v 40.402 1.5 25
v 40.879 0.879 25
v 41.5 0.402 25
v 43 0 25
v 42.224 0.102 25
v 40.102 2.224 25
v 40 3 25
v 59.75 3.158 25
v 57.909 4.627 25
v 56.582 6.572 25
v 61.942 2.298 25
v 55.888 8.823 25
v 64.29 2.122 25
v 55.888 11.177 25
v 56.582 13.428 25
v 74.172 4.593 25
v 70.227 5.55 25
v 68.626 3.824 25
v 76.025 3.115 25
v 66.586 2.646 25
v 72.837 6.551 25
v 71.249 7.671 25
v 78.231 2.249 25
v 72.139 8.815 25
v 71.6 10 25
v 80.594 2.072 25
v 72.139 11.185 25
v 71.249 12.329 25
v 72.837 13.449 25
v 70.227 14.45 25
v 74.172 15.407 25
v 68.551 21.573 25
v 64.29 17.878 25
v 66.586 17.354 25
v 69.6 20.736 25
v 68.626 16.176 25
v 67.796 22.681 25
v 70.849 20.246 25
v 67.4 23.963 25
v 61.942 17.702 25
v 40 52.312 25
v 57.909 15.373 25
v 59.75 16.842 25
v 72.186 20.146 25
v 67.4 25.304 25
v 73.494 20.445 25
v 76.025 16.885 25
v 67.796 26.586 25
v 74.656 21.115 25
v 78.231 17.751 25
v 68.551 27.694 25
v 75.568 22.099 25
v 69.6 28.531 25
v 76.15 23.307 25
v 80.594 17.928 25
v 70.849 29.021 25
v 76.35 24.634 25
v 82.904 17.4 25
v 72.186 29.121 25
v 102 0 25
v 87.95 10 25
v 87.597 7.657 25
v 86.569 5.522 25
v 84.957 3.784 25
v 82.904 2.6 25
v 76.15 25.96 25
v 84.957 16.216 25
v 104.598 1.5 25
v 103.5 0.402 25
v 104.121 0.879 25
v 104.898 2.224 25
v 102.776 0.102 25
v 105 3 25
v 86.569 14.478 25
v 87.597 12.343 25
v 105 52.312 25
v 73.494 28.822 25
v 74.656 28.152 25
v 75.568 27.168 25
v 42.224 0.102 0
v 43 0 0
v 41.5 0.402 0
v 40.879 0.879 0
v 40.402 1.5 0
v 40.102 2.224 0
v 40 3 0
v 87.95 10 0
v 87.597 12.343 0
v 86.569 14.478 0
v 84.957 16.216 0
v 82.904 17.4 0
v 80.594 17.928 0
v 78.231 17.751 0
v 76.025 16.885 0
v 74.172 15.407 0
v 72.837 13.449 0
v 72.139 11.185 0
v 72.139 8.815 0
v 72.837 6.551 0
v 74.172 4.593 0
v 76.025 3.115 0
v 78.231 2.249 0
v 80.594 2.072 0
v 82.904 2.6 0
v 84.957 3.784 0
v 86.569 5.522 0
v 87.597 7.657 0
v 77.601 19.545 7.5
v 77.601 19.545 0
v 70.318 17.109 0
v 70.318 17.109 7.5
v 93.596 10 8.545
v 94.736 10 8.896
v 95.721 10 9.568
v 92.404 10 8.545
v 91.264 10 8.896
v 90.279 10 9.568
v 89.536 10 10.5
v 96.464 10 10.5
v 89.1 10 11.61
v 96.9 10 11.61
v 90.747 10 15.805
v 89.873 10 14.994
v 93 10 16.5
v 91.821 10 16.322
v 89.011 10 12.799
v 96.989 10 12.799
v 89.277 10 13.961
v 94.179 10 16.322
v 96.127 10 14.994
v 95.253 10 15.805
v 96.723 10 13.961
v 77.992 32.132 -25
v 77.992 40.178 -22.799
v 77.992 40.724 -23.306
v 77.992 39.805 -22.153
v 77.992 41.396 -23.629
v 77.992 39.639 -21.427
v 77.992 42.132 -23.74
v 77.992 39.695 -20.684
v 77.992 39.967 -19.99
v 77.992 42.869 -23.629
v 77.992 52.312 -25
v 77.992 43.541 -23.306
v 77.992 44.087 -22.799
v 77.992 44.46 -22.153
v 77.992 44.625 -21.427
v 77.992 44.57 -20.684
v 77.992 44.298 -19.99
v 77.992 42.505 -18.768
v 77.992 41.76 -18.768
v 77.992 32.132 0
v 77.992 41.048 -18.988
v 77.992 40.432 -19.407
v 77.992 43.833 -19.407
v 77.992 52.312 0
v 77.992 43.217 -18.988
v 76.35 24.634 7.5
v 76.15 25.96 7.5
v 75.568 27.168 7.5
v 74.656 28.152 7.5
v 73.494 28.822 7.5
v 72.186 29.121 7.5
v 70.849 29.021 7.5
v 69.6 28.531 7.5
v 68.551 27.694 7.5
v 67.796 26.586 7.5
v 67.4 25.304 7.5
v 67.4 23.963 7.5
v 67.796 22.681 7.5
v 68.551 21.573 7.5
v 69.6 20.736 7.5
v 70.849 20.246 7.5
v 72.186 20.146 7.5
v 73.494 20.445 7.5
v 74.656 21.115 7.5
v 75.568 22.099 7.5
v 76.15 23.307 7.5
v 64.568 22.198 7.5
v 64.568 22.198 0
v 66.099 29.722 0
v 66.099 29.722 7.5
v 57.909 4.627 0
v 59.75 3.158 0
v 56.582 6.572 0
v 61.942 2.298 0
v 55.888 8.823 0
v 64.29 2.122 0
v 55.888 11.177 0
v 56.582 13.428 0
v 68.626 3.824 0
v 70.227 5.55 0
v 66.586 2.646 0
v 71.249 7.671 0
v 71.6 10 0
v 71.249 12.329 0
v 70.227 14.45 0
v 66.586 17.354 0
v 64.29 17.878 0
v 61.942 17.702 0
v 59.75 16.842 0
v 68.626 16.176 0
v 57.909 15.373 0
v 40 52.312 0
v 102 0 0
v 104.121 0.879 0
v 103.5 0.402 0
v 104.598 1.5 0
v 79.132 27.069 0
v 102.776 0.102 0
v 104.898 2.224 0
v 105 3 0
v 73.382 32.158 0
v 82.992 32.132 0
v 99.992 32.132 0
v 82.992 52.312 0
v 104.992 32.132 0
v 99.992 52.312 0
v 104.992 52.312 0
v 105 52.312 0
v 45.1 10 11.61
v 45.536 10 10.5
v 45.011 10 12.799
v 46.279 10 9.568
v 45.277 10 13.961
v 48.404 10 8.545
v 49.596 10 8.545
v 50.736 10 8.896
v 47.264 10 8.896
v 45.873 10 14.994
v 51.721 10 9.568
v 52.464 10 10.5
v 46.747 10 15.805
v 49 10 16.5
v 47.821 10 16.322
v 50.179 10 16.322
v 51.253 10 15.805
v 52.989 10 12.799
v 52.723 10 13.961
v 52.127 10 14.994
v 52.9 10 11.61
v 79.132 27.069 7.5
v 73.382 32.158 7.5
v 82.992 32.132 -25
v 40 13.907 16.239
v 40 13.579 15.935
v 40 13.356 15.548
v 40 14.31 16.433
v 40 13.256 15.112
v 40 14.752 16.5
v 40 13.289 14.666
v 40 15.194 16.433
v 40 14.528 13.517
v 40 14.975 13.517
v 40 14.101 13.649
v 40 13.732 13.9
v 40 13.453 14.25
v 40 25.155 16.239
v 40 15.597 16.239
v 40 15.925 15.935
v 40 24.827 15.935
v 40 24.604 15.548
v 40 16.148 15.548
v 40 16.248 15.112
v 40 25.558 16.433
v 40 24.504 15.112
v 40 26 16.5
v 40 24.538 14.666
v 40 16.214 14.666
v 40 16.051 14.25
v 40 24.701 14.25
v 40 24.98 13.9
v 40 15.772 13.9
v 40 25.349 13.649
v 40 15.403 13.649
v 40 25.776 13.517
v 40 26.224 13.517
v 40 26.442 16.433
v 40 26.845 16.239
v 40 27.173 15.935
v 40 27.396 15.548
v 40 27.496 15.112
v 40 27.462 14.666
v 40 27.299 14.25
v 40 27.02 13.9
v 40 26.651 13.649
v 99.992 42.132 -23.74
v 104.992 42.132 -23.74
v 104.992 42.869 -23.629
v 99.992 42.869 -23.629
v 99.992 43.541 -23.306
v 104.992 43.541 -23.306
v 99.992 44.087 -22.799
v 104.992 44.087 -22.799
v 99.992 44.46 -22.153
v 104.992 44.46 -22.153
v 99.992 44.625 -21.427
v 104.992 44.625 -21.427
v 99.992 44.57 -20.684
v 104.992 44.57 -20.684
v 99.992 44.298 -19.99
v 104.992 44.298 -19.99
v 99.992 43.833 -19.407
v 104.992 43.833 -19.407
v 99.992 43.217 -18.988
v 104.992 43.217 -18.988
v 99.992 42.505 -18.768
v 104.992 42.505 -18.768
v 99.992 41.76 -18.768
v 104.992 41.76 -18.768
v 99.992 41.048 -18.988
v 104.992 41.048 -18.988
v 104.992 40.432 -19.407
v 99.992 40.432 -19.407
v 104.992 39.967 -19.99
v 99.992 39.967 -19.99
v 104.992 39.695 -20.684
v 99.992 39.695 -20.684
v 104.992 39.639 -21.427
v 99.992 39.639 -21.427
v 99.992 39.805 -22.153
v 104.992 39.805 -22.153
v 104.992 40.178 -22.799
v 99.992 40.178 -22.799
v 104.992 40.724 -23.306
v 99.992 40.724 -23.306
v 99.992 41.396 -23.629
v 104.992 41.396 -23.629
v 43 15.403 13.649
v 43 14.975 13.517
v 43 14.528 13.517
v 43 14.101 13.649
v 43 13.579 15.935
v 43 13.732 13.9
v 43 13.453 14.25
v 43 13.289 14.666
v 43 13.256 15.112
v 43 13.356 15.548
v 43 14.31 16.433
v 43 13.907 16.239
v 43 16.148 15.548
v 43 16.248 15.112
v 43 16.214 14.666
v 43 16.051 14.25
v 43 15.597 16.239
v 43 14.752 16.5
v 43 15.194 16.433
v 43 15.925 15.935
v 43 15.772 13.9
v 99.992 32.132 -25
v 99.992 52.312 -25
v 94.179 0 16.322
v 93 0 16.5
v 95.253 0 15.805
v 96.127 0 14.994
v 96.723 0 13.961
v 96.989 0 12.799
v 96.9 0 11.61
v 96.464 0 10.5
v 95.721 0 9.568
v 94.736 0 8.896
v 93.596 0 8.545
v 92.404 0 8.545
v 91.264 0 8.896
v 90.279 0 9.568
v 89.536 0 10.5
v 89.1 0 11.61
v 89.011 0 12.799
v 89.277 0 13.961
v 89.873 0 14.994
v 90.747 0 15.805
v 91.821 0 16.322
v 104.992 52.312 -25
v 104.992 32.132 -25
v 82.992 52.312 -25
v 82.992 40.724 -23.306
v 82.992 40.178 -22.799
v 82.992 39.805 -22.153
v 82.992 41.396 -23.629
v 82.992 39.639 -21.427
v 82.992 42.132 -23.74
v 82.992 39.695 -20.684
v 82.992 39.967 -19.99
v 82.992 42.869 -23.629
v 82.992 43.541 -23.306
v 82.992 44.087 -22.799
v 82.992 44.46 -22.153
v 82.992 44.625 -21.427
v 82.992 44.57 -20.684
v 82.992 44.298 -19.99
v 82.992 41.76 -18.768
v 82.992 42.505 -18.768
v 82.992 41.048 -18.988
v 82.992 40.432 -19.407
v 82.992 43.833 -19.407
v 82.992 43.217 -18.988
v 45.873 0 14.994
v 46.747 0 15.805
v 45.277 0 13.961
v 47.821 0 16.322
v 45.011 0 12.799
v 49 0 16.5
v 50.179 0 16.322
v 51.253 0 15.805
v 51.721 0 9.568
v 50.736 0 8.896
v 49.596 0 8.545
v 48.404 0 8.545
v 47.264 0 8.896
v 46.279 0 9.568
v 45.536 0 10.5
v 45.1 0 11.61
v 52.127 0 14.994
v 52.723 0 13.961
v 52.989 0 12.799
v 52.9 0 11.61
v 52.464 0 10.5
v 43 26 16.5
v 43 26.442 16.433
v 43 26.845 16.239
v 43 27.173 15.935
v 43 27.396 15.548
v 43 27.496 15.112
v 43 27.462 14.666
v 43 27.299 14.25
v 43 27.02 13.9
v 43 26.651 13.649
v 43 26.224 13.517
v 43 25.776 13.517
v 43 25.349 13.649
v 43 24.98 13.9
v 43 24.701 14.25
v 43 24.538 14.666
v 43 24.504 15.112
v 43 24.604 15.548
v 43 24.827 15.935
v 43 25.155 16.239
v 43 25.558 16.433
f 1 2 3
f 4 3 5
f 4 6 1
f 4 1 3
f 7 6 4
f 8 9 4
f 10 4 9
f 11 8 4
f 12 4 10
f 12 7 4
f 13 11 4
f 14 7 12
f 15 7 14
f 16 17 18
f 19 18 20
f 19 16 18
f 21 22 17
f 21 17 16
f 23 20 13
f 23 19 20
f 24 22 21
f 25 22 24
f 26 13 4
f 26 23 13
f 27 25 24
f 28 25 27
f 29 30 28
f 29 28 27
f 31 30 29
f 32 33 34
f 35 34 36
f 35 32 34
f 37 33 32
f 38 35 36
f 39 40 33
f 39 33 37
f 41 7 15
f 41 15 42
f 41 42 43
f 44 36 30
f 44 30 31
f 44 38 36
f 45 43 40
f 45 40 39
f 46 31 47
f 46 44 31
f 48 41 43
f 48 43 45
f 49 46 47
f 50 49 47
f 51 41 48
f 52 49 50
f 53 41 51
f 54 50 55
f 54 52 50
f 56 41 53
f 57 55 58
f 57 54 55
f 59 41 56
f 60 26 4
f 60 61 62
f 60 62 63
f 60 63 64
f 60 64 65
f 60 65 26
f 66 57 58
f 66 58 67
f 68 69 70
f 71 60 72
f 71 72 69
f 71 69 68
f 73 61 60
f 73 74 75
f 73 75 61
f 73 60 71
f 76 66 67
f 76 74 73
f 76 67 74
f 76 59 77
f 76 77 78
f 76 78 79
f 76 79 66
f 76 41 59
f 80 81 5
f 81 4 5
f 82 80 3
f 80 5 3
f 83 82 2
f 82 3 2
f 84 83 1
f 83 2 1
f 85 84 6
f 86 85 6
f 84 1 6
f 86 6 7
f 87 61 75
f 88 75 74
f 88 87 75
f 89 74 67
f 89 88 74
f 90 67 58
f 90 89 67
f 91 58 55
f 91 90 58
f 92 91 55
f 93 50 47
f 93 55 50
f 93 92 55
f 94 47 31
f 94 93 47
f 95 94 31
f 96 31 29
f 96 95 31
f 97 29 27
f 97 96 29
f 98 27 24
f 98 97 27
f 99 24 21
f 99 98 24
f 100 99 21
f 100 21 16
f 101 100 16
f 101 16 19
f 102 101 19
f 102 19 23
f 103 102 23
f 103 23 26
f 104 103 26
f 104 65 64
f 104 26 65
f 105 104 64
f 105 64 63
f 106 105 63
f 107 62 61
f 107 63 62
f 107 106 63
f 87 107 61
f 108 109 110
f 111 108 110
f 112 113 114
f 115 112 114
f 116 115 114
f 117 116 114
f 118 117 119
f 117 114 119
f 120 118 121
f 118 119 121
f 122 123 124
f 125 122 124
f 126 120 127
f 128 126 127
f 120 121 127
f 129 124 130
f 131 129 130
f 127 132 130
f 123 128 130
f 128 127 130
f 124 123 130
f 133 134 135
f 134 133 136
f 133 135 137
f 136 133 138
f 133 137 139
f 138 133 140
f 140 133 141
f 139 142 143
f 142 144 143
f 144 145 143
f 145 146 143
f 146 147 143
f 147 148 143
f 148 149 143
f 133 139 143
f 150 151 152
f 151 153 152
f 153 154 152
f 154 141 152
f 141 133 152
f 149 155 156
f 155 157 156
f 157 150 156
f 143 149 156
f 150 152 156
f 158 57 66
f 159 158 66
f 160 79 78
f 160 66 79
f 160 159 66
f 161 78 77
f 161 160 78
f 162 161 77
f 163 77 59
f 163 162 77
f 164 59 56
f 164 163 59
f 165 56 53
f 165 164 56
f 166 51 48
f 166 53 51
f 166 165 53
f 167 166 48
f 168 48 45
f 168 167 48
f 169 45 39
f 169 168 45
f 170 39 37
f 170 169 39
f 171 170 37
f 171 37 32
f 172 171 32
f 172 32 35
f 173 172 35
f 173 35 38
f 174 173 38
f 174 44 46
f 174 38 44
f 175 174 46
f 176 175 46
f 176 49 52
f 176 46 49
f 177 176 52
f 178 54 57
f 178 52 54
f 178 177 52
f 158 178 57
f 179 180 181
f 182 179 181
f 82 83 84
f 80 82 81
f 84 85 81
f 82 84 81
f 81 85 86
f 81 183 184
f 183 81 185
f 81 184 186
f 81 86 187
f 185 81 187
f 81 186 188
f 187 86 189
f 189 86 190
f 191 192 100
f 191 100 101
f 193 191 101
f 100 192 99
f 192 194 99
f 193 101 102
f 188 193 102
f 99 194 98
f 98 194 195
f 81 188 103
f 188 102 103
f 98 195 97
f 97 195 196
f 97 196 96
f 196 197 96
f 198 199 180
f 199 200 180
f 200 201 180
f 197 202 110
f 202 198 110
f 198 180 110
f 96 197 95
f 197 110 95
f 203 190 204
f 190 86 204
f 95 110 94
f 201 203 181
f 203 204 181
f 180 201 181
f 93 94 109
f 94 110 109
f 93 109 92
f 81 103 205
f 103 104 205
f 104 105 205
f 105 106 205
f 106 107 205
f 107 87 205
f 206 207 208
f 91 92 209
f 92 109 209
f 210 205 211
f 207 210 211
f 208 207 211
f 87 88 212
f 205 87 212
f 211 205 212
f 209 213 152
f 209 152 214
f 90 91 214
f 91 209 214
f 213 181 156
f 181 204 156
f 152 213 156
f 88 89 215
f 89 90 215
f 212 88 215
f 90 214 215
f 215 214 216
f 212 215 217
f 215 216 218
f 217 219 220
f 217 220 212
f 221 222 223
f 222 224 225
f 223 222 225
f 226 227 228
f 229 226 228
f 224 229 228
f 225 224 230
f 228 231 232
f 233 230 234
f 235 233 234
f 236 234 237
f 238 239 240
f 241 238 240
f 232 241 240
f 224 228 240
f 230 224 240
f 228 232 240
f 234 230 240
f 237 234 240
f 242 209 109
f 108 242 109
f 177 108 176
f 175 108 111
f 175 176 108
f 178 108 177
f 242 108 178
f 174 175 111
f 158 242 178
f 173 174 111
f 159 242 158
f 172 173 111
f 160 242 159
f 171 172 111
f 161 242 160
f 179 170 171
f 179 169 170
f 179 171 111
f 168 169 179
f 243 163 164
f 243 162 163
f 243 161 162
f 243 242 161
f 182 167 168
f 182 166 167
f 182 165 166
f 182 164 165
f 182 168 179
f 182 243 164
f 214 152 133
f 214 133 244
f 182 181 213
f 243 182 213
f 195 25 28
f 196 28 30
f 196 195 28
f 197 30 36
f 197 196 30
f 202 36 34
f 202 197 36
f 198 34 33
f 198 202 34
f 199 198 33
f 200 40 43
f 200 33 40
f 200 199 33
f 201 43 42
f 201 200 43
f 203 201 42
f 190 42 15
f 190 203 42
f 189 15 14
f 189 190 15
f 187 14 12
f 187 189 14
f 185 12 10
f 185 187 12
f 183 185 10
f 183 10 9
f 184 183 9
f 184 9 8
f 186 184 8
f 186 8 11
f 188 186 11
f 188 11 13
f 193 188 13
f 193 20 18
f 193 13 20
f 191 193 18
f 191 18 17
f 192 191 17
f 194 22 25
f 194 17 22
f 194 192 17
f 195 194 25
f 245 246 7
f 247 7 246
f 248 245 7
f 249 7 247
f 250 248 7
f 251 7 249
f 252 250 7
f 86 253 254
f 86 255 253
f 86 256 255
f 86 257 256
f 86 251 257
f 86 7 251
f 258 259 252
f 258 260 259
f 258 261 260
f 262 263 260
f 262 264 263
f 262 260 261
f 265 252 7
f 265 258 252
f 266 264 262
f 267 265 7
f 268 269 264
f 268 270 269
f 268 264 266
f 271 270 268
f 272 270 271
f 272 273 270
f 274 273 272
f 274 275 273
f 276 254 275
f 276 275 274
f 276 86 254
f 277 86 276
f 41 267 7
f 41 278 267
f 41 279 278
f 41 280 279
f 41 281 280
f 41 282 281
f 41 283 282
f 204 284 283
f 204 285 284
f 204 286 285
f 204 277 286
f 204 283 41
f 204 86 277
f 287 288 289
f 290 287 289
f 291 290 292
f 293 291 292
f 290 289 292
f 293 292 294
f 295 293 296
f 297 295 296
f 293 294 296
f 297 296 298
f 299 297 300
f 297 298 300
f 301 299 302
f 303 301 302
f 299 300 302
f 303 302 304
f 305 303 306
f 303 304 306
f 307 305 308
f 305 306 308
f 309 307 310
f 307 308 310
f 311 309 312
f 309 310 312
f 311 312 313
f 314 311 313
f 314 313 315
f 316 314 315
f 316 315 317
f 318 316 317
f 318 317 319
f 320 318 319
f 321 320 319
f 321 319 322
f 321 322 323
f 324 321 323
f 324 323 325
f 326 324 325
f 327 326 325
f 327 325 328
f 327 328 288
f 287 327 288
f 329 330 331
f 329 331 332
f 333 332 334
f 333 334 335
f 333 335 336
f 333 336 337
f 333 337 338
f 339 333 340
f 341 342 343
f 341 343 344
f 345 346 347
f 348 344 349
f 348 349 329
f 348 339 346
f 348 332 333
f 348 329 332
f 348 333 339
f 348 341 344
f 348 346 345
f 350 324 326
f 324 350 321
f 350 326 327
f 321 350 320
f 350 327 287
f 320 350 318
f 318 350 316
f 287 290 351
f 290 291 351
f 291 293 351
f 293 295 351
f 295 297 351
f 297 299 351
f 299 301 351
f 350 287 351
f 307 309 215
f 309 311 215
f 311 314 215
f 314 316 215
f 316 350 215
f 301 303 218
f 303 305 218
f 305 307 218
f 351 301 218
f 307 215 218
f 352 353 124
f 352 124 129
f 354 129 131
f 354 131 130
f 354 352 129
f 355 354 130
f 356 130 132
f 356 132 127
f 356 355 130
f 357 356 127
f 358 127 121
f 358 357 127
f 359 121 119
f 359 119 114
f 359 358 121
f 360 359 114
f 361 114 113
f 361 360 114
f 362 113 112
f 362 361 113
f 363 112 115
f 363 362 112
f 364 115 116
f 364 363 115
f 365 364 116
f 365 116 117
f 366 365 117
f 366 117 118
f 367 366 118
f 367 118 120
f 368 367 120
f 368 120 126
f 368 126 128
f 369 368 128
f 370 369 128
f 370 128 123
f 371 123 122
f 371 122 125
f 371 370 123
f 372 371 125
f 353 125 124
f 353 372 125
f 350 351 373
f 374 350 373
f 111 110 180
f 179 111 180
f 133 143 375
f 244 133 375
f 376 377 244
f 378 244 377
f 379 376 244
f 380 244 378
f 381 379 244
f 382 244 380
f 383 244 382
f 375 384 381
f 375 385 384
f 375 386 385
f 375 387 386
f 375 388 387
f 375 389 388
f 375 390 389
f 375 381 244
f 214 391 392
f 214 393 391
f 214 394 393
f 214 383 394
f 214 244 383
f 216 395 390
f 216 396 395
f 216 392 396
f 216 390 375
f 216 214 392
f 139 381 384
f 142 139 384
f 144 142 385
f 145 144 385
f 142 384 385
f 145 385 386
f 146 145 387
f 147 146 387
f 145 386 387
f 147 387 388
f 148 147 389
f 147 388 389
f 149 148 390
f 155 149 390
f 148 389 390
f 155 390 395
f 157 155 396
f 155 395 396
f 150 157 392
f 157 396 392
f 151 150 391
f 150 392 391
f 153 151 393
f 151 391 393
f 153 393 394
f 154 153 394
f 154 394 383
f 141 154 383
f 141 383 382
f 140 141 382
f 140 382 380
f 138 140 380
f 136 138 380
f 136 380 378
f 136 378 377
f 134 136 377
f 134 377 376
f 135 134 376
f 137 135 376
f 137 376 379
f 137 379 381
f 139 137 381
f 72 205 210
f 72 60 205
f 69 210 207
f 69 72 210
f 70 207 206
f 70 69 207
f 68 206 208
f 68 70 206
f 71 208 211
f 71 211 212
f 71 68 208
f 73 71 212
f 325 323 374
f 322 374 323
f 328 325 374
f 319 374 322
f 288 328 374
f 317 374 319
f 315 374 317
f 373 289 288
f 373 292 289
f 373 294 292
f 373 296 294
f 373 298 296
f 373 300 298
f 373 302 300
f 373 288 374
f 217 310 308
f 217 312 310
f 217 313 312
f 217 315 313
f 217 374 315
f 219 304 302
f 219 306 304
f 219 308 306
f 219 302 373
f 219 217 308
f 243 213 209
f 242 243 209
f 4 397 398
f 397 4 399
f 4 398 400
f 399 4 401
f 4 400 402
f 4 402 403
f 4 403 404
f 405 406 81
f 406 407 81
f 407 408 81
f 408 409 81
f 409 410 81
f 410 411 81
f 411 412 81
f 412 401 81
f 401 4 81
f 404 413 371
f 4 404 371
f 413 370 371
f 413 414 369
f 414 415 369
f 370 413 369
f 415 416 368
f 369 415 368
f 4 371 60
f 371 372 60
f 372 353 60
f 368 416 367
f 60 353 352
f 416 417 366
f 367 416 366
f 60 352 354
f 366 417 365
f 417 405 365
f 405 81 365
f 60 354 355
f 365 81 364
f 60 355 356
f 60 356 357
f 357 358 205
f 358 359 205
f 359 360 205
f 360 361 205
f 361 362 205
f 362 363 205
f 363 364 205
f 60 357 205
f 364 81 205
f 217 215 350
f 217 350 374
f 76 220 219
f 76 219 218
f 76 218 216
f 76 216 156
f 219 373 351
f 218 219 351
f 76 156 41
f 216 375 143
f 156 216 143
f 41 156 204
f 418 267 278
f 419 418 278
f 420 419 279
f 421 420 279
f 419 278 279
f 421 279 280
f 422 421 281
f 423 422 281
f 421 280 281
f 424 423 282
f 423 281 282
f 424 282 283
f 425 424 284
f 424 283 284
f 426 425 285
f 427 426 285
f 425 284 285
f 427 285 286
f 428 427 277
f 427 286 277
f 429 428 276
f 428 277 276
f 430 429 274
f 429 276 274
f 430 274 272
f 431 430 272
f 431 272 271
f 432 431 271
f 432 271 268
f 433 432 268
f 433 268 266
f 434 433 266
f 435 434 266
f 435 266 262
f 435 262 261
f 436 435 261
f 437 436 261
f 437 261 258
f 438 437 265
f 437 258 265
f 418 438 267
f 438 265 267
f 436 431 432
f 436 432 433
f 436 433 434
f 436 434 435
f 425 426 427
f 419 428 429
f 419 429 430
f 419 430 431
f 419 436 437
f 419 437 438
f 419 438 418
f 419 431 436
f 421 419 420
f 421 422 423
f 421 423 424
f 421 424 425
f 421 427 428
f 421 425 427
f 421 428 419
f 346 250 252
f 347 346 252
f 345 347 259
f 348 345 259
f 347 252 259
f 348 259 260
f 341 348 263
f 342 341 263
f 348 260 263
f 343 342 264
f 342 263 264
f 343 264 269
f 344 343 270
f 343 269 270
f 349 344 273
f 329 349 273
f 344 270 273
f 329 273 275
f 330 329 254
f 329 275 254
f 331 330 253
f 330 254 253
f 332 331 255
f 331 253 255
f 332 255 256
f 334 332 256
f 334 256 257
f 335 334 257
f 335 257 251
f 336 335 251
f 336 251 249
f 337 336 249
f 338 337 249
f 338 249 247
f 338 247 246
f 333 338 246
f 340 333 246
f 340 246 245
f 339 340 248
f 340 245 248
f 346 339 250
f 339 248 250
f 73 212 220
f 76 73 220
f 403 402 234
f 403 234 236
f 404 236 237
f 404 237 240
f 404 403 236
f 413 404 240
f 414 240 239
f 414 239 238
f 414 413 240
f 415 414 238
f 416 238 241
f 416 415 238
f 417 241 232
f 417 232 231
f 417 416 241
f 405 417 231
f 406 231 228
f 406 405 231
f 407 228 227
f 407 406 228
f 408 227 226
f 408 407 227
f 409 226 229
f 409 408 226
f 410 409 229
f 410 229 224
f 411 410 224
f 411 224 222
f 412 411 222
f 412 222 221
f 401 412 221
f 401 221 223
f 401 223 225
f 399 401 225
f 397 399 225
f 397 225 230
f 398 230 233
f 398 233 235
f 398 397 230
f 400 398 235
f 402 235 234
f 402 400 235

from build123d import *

# Parameters (mm, degrees)
ESQUISSE1_W              = 105
ESQUISSE1_H              = 80
BOSS_EXTRU_1_DEPTH       = 25
ESQUISSE2_R              = 7.9
ESQUISSE2_R_2            = 7.95
ESQUISSE2_R_3            = 4.5
ENL_V_MAT_EXTRU_1_DEPTH  = 135.350288425
ESQUISSE3_R              = 4
ENL_V_MAT_EXTRU_3_DEPTH  = 10
ESQUISSE6_W              = 40
ESQUISSE6_H              = 80
ENL_V_MAT_EXTRU_6_DEPTH  = 135.350288425
ESQUISSE7_W              = 65
ESQUISSE7_H              = 2.68813313
ENL_V_MAT_EXTRU_7_DEPTH  = 135.350288425
CONG_1_R                 = 3
ESQUISSE9_W              = 5
ESQUISSE9_H              = 20.179429856
ESQUISSE9_H_2            = 20.18
BOSS_EXTRU_2_DEPTH       = 25
ESQUISSE10_R             = 2.5
ENL_V_MAT_EXTRU_8_DEPTH  = 105.048287139
ENL_V_MAT_EXTRU_9_DEPTH  = 7.5
ENL_V_MAT_EXTRU_11_DEPTH = 133.767182537
ESQUISSE13_R             = 1.5
ENL_V_MAT_EXTRU_12_DEPTH = 3


with BuildPart() as part:
    # Esquisse1 → Boss.-Extru.1 (new body)
    with BuildSketch(Plane.XY):
        with Locations((52.5, 40)):
            Rectangle(ESQUISSE1_W, ESQUISSE1_H)
    extrude(amount=BOSS_EXTRU_1_DEPTH)

    # Esquisse2 → Enlèv. mat.-Extru.1 (cut, through all)
    with BuildSketch(Plane.XY):
        with Locations((63.7, 10)):
            Circle(ESQUISSE2_R)
        with Locations((80, 10)):
            Circle(ESQUISSE2_R_2)
        with Locations((71.85, 24.633523157)):
            Circle(ESQUISSE2_R_3)
    extrude(amount=ENL_V_MAT_EXTRU_1_DEPTH, mode=Mode.SUBTRACT)

    # Esquisse3 → Enlèv. mat.-Extru.3 (cut)
    with BuildSketch(Plane(origin=(0, 0, 0), x_dir=(1, 0, 0), z_dir=(0, 1, 0))):
        with Locations(Location((49, -12.5, 0), (0, 0, 270))):
            Circle(ESQUISSE3_R)
        with Locations(Location((93, -12.5, 0), (0, 0, 270))):
            Circle(ESQUISSE3_R)
    extrude(amount=ENL_V_MAT_EXTRU_3_DEPTH, mode=Mode.SUBTRACT)

    # Esquisse6 → Enlèv. mat.-Extru.6 (cut, through all)
    with BuildSketch(Plane.XY):
        with Locations((20, 40)):
            Rectangle(ESQUISSE6_W, ESQUISSE6_H)
    extrude(amount=ENL_V_MAT_EXTRU_6_DEPTH, mode=Mode.SUBTRACT)

    # Esquisse7 → Enlèv. mat.-Extru.7 (cut, through all)
    with BuildSketch(Plane.XY):
        with Locations((72.5, 78.655933435)):
            Rectangle(ESQUISSE7_W, ESQUISSE7_H)
    extrude(amount=ENL_V_MAT_EXTRU_7_DEPTH, mode=Mode.SUBTRACT)

    # Congé1
    cong_1_edges = [part.edges().sort_by_distance(p)[0] for p in [
        (40, 0, 12.5),
        (105, 77.31186687, 12.5),
        (40, 77.31186687, 12.5),
        (105, 0, 12.5),
    ]]
    fillet(cong_1_edges, radius=CONG_1_R)

    # Esquisse9 → Boss.-Extru.2 (add)
    with BuildSketch(Plane.XY):
        with Locations((102.49170176, 42.222151942)):
            Rectangle(ESQUISSE9_W, ESQUISSE9_H)
        with Locations((80.49170176, 42.22186687)):
            Rectangle(ESQUISSE9_W, ESQUISSE9_H_2)
    extrude(amount=-BOSS_EXTRU_2_DEPTH)

    # Esquisse10 → Enlèv. mat.-Extru.8 (cut, through all)
    with BuildSketch(Plane(origin=(104.99170176, 0, 0), x_dir=(0, 0, -1), z_dir=(1, 0, 0))):
        with Locations((21.24, 42.132437014)):
            Circle(ESQUISSE10_R)
    extrude(amount=-ENL_V_MAT_EXTRU_8_DEPTH, mode=Mode.SUBTRACT)

    # Esquisse11 → Enlèv. mat.-Extru.9 (cut)
    with BuildSketch(Plane(origin=(0, 0, 0), x_dir=(-1, 0, 0), z_dir=(0, 0, -1))):
        Polygon((-73.38169787, 32.15796566), (-79.132207291, 27.069255143), (-77.600509422, 19.54481264), (-70.31830213, 17.109080655), (-64.567792709, 22.197791172), (-66.099490578, 29.722233675), align=None)
    extrude(amount=-ENL_V_MAT_EXTRU_9_DEPTH, mode=Mode.SUBTRACT)

    # Esquisse12 → Enlèv. mat.-Extru.11 (cut, through all)
    with BuildSketch(Plane(origin=(0, 0, 0), x_dir=(-1, 0, 0), z_dir=(0, 0, -1))):
        Polygon((-105.676011247, 77.330619324), (-105.676011247, 52.31186687), (-104.99170176, 52.31186687), (-39.98533212, 52.31186687), (-39.98533212, 77.330619324), (-104.99170176, 77.330619324), align=None)
    extrude(amount=-ENL_V_MAT_EXTRU_11_DEPTH, mode=Mode.SUBTRACT)

    # Esquisse13 → Enlèv. mat.-Extru.12 (cut)
    with BuildSketch(Plane.ZY.offset(-40)):
        with Locations((15, 14.75187619)):
            Circle(ESQUISSE13_R)
        with Locations((15, 26)):
            Circle(ESQUISSE13_R)
    extrude(amount=-ENL_V_MAT_EXTRU_12_DEPTH, mode=Mode.SUBTRACT)


solid = part.part
